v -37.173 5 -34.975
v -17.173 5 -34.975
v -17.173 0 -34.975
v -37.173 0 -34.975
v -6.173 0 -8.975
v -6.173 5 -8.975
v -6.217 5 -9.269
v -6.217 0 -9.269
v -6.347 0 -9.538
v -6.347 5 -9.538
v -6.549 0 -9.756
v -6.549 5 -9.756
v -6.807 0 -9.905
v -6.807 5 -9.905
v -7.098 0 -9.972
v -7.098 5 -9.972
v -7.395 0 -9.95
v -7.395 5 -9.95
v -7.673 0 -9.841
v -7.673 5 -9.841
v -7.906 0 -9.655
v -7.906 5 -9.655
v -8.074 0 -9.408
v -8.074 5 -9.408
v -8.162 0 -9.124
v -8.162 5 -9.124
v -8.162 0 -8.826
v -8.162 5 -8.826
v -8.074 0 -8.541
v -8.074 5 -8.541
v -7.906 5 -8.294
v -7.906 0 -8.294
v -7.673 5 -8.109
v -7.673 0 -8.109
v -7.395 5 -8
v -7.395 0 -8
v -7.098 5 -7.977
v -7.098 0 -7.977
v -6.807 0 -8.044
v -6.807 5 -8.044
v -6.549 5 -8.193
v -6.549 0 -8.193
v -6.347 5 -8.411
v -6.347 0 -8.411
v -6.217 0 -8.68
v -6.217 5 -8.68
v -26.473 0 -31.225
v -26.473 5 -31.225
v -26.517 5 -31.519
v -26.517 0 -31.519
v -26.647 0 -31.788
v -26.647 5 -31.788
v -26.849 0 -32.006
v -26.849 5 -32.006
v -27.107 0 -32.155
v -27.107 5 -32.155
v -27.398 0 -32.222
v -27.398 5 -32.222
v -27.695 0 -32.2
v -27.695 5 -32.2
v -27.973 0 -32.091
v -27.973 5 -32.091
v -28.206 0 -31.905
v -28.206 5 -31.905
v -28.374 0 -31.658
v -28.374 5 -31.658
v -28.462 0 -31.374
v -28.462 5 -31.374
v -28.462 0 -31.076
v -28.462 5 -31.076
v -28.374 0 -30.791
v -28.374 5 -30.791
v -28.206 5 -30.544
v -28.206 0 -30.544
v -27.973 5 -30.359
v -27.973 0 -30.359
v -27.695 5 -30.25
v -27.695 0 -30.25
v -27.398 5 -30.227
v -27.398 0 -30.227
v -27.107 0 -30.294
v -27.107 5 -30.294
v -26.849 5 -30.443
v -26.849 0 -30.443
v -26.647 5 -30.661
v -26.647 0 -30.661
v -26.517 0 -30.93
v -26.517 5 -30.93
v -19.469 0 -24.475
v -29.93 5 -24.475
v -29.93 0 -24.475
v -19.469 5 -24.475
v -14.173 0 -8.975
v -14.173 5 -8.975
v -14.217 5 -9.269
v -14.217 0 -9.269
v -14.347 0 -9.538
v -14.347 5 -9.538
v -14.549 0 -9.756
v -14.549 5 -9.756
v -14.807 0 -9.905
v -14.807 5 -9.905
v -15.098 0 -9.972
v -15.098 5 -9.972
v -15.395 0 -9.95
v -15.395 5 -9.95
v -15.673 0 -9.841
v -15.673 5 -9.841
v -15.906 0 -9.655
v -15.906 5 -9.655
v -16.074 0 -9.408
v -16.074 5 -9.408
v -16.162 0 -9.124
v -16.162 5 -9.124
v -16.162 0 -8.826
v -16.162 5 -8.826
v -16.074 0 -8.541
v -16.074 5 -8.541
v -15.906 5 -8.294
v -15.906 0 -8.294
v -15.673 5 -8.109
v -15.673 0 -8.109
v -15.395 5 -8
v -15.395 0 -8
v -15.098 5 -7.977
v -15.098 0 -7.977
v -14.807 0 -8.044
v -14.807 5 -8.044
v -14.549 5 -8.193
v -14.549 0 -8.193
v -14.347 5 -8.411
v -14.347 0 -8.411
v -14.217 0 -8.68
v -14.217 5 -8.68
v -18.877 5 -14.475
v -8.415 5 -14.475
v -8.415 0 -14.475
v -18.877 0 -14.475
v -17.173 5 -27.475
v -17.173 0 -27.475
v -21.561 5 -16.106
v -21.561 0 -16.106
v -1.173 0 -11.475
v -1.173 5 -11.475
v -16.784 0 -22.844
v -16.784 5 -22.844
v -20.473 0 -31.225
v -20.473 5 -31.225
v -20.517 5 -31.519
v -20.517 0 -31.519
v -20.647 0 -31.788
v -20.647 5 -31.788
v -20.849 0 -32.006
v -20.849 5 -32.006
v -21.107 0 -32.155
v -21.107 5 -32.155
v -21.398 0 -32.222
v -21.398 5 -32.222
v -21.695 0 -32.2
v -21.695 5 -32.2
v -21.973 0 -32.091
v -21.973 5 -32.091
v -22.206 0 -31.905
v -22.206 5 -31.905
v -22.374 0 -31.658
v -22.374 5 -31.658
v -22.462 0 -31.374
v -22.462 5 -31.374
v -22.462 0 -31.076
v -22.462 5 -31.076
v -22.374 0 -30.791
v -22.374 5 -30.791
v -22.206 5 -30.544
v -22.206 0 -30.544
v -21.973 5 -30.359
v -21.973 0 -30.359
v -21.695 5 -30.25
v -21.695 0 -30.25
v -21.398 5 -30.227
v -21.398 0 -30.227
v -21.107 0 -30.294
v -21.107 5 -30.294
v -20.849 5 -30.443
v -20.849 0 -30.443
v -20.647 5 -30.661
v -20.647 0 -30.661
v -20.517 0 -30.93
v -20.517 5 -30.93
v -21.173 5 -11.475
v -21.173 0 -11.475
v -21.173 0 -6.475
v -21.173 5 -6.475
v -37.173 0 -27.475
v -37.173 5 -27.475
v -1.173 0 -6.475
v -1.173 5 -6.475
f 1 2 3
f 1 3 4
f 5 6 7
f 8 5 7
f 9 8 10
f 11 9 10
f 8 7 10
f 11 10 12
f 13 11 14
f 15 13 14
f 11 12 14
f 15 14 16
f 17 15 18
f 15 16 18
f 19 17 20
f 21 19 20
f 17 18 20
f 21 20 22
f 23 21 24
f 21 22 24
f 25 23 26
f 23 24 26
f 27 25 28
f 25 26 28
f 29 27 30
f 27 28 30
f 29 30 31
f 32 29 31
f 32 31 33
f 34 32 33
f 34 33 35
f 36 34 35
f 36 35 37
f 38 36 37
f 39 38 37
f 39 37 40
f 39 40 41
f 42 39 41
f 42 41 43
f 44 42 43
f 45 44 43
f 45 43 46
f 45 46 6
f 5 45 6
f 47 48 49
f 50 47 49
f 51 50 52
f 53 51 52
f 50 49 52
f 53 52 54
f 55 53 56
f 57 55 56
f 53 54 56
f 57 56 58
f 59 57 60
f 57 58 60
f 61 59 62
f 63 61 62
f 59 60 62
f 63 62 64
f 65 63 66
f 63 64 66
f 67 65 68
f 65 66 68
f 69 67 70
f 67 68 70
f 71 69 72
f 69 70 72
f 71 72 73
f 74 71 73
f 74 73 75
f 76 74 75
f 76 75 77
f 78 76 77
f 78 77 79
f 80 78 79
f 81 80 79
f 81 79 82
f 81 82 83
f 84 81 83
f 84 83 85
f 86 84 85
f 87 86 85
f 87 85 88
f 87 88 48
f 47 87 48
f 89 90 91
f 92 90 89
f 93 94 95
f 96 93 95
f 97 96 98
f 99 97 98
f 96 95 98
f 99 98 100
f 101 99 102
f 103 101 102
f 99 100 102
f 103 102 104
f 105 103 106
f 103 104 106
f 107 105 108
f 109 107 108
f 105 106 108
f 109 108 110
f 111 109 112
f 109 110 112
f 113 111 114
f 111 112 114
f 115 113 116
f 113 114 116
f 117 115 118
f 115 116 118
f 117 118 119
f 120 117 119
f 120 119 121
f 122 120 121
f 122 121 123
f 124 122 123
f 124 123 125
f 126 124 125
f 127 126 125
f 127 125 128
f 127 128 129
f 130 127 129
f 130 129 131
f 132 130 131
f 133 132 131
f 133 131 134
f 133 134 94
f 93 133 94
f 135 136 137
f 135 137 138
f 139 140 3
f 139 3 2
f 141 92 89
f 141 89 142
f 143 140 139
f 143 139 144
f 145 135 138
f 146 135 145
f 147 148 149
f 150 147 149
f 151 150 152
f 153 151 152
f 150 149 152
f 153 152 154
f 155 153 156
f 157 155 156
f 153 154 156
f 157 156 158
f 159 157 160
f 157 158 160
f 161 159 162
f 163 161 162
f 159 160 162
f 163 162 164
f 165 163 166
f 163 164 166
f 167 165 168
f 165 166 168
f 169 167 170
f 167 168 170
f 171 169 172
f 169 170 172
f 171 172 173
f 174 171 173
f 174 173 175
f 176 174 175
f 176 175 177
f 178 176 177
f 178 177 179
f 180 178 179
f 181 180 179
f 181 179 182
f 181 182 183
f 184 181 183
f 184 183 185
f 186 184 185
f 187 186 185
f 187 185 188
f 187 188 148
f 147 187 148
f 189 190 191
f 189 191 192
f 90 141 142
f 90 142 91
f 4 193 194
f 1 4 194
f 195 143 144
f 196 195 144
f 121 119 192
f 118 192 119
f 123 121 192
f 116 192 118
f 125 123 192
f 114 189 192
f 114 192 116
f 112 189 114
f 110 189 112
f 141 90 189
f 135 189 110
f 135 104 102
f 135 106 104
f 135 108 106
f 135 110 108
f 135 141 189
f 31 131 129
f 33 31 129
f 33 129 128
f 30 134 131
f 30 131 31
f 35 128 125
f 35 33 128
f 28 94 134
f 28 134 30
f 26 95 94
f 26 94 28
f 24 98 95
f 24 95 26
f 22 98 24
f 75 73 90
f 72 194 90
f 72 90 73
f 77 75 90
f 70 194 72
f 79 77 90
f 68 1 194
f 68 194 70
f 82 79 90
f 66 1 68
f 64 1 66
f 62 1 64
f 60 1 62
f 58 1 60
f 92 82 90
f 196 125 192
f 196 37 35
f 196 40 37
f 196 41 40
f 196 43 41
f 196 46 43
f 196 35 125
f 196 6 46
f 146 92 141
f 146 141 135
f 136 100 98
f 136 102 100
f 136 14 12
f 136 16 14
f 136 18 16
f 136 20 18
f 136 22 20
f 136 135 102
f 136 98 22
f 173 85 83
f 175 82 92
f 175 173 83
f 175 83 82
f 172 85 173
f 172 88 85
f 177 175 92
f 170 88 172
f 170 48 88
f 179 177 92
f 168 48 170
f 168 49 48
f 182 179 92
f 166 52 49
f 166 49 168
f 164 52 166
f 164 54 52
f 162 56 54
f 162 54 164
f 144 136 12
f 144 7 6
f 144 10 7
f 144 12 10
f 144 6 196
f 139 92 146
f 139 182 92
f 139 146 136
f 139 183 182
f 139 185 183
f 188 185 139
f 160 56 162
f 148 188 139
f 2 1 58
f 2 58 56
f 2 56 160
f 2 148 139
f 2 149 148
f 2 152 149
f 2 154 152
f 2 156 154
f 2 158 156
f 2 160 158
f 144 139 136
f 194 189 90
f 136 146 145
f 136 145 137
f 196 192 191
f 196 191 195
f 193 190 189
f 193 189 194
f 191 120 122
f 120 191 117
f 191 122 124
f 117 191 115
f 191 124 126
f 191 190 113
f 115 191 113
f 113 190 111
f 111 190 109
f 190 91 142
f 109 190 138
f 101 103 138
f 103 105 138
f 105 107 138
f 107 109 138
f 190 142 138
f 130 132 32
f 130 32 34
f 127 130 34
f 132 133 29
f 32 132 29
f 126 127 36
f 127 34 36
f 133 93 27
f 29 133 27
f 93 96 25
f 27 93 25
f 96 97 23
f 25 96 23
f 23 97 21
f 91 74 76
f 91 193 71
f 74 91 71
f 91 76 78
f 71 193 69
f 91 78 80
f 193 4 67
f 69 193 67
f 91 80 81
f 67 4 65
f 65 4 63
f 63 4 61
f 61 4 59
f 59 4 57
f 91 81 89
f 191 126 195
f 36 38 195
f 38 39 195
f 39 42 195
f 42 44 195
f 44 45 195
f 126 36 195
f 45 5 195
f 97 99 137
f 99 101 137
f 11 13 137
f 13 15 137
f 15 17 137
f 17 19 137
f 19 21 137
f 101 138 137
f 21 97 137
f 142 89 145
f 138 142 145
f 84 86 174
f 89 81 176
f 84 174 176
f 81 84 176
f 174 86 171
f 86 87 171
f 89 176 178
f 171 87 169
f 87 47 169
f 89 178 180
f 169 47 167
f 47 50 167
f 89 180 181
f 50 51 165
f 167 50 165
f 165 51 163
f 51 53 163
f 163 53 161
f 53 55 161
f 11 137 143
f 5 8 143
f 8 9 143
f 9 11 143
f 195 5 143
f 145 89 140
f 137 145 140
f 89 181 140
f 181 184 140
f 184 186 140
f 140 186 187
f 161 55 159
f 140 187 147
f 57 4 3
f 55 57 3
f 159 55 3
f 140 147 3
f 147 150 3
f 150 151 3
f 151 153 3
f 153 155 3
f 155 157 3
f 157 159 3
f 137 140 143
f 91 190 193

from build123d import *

# Parameters (mm, degrees)
BOSS_EXTRUDE1_DEPTH = 5
SKETCH2_W           = 20
SKETCH2_H           = 5
BOSS_EXTRUDE2_DEPTH = 7.5
SKETCH3_W           = 20
SKETCH3_H           = 5
BOSS_EXTRUDE3_DEPTH = 5
CUT_EXTRUDE2_REACH  = 7
CUT_EXTRUDE3_REACH  = 7
SKETCH7_R           = 1
CUT_EXTRUDE4_REACH  = 7
SKETCH8_R           = 1


with BuildPart() as part:
    # Sketch1 → Boss-Extrude1 (new body)
    with BuildSketch(Plane(origin=(0, 0, 0), x_dir=(1, 0, 0), z_dir=(0, 1, 0))):
        Polygon((-37.172745284, 27.474605058), (-17.172745284, 27.474605058), (-1.172745284, 11.474605058), (-21.172745284, 11.474605058), align=None)
    extrude(amount=BOSS_EXTRUDE1_DEPTH)

    # Sketch2 → Boss-Extrude2 (add)
    with BuildSketch(Plane(origin=(0, 0, -27.474605058), x_dir=(-1, 0, 0), z_dir=(0, 0, -1))):
        with Locations((27.172745284, 2.5)):
            Rectangle(SKETCH2_W, SKETCH2_H)
    extrude(amount=BOSS_EXTRUDE2_DEPTH)

    # Sketch3 → Boss-Extrude3 (add)
    with BuildSketch(Plane.XY.offset(-11.474605058)):
        with Locations((-11.172745284, 2.5)):
            Rectangle(SKETCH3_W, SKETCH3_H)
    extrude(amount=BOSS_EXTRUDE3_DEPTH)

    # Sketch5 → Cut-Extrude2 (cut, up to next)
    with BuildSketch(Plane(origin=(0, 5, 0), x_dir=(1, 0, 0), z_dir=(0, 1, 0)), mode=Mode.PRIVATE) as cut_extrude2_sk1:
        Polygon((-16.784341734, 22.843560821), (-8.415385971, 14.474605058), (-18.876580675, 14.474605058), align=None)
    cut_extrude2_tool1 = extrude(cut_extrude2_sk1.sketch, amount=-CUT_EXTRUDE2_REACH, mode=Mode.PRIVATE) & part.part
    add(cut_extrude2_tool1.solids().sort_by_distance((-14.692103, 5, -17.264257))[0], mode=Mode.SUBTRACT)
    # Sketch5 → Cut-Extrude2 (cut, up to next)
    with BuildSketch(Plane(origin=(0, 5, 0), x_dir=(1, 0, 0), z_dir=(0, 1, 0)), mode=Mode.PRIVATE) as cut_extrude2_sk2:
        Polygon((-21.561148834, 16.105649296), (-29.930104597, 24.474605058), (-19.468909894, 24.474605058), align=None)
    cut_extrude2_tool2 = extrude(cut_extrude2_sk2.sketch, amount=-CUT_EXTRUDE2_REACH, mode=Mode.PRIVATE) & part.part
    add(cut_extrude2_tool2.solids().sort_by_distance((-23.653388, 5, -21.684953))[0], mode=Mode.SUBTRACT)

    # Sketch7 → Cut-Extrude3 (cut, up to next)
    with BuildSketch(Plane(origin=(0, 5, 0), x_dir=(1, 0, 0), z_dir=(0, 1, 0)), mode=Mode.PRIVATE) as cut_extrude3_sk1:
        with Locations((-15.172745284, 8.974605058)):
            Circle(SKETCH7_R)
    cut_extrude3_tool1 = extrude(cut_extrude3_sk1.sketch, amount=-CUT_EXTRUDE3_REACH, mode=Mode.PRIVATE) & part.part
    add(cut_extrude3_tool1.solids().sort_by_distance((-15.172745, 5, -8.974605))[0], mode=Mode.SUBTRACT)
    # Sketch7 → Cut-Extrude3 (cut, up to next)
    with BuildSketch(Plane(origin=(0, 5, 0), x_dir=(1, 0, 0), z_dir=(0, 1, 0)), mode=Mode.PRIVATE) as cut_extrude3_sk2:
        with Locations((-7.172745284, 8.974605058)):
            Circle(SKETCH7_R)
    cut_extrude3_tool2 = extrude(cut_extrude3_sk2.sketch, amount=-CUT_EXTRUDE3_REACH, mode=Mode.PRIVATE) & part.part
    add(cut_extrude3_tool2.solids().sort_by_distance((-7.172745, 5, -8.974605))[0], mode=Mode.SUBTRACT)

    # Sketch8 → Cut-Extrude4 (cut, up to next)
    with BuildSketch(Plane(origin=(0, 5, 0), x_dir=(1, 0, 0), z_dir=(0, 1, 0)), mode=Mode.PRIVATE) as cut_extrude4_sk1:
        with Locations((-21.472745284, 31.224605058)):
            Circle(SKETCH8_R)
    cut_extrude4_tool1 = extrude(cut_extrude4_sk1.sketch, amount=-CUT_EXTRUDE4_REACH, mode=Mode.PRIVATE) & part.part
    add(cut_extrude4_tool1.solids().sort_by_distance((-21.472745, 5, -31.224605))[0], mode=Mode.SUBTRACT)
    # Sketch8 → Cut-Extrude4 (cut, up to next)
    with BuildSketch(Plane(origin=(0, 5, 0), x_dir=(1, 0, 0), z_dir=(0, 1, 0)), mode=Mode.PRIVATE) as cut_extrude4_sk2:
        with Locations((-27.472745284, 31.224605058)):
            Circle(SKETCH8_R)
    cut_extrude4_tool2 = extrude(cut_extrude4_sk2.sketch, amount=-CUT_EXTRUDE4_REACH, mode=Mode.PRIVATE) & part.part
    add(cut_extrude4_tool2.solids().sort_by_distance((-27.472745, 5, -31.224605))[0], mode=Mode.SUBTRACT)


solid = part.part
